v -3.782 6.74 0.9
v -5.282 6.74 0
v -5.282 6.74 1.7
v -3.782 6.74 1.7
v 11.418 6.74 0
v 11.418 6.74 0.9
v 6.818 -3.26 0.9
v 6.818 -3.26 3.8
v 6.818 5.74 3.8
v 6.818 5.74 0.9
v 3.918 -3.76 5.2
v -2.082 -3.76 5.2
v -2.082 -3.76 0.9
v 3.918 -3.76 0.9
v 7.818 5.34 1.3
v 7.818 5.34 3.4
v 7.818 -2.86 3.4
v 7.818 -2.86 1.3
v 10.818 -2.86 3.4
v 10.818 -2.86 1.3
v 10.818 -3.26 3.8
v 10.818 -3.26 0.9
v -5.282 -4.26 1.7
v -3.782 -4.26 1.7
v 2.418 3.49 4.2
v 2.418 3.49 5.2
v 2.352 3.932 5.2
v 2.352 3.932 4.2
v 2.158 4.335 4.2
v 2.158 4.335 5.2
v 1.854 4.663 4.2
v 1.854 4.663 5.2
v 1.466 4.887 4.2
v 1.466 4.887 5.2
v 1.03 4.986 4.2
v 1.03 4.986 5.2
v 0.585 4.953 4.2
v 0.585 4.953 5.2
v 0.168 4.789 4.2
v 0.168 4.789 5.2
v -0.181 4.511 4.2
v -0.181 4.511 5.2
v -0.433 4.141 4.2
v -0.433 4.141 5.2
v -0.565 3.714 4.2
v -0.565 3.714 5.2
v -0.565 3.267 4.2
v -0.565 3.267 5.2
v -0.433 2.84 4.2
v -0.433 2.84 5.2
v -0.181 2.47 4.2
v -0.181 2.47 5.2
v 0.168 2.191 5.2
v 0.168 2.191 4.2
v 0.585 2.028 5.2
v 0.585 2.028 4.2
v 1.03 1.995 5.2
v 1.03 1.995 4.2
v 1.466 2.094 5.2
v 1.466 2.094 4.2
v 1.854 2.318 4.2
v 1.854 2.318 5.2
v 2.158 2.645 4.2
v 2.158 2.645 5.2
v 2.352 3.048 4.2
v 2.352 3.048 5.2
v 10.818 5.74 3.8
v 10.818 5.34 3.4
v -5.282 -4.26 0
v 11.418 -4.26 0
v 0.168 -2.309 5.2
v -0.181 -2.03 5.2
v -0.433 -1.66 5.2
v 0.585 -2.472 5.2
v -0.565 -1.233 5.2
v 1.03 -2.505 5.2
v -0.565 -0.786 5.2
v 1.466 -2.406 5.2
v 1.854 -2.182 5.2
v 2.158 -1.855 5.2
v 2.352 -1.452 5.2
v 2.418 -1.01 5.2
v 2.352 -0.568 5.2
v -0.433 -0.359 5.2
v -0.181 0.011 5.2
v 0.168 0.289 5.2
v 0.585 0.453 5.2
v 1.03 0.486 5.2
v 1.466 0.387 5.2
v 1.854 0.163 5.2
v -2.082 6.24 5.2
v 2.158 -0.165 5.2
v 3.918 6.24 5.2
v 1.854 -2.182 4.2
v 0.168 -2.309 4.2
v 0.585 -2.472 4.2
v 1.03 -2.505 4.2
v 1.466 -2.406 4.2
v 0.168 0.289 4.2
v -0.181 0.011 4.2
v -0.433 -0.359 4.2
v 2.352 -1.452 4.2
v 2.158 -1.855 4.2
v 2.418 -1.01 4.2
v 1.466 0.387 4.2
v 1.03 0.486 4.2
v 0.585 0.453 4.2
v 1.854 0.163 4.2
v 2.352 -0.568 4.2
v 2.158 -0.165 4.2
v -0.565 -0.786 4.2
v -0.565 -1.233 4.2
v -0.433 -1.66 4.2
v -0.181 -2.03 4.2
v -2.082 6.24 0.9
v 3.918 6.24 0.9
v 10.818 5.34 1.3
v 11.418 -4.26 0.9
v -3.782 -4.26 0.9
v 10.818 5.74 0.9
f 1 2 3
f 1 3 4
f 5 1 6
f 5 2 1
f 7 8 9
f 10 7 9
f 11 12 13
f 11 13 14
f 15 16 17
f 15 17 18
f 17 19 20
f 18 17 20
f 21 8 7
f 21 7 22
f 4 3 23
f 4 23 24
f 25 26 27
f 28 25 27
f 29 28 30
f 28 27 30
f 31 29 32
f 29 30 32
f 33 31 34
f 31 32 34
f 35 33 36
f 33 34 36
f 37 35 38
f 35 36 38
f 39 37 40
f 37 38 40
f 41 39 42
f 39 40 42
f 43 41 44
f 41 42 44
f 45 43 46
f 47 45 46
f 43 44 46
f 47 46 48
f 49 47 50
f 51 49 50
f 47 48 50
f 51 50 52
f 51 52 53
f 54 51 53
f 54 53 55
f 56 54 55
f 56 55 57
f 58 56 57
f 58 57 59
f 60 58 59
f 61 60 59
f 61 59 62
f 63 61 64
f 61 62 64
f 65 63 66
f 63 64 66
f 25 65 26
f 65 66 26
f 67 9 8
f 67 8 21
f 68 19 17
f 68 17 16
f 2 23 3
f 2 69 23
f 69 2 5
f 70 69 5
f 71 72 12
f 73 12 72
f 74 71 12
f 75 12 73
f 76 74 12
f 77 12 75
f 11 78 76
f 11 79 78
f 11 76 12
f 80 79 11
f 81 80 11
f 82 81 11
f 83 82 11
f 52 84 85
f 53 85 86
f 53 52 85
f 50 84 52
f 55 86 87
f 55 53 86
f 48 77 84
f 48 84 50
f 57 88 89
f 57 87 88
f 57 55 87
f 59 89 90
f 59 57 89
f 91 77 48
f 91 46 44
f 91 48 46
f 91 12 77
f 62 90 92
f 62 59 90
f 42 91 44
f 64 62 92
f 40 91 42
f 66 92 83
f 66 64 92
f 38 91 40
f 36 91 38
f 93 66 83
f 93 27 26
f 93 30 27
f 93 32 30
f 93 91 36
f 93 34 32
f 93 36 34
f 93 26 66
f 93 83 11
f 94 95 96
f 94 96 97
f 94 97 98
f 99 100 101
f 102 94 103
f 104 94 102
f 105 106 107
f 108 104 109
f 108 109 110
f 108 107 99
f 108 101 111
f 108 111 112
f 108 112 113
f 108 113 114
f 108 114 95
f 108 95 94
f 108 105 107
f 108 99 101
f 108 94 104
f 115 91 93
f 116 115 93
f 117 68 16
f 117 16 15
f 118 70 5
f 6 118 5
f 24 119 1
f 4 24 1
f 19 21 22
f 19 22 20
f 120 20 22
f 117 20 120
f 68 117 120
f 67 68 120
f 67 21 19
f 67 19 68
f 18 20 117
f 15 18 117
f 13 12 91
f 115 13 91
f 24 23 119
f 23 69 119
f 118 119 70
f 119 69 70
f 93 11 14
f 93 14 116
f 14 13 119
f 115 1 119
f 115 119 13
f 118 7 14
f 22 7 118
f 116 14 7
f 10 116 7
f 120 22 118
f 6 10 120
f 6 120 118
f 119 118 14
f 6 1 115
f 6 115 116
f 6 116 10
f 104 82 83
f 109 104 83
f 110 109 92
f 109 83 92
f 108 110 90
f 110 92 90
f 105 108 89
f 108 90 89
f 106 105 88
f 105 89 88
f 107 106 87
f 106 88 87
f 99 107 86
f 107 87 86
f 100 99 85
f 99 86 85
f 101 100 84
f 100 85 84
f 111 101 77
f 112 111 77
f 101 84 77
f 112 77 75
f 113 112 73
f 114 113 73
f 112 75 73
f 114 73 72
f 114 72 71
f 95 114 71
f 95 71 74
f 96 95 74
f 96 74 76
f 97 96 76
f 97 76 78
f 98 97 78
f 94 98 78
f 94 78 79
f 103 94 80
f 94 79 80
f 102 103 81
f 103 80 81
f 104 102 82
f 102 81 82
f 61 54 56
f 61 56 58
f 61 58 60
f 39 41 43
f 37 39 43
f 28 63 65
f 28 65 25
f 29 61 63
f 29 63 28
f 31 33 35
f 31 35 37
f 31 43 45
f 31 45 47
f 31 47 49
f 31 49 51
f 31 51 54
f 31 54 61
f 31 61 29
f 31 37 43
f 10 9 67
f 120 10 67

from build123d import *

# Parameters (mm, degrees)
ESBO_O1_W                = 16.7
ESBO_O1_H                = 11
RESSALTO_EXTRUS_O1_DEPTH = 5.2
ESBO_O2_W                = 16.7
ESBO_O2_H                = 11
ESBO_O2_W_2              = 6
ESBO_O2_H_2              = 10
ESBO_O2_W_3              = 4
ESBO_O2_H_3              = 9
CORTE_EXTRUS_O1_DEPTH    = 4.3
ESBO_O3_W                = 4
ESBO_O3_H                = 9
CORTE_EXTRUS_O2_DEPTH    = 1.4
ESBO_O4_R                = 1.5
CORTE_EXTRUS_O3_DEPTH    = 1
ESBO_O5_W                = 2.1
ESBO_O5_H                = 8.2
CORTE_EXTRUS_O4_DEPTH    = 3
ESBO_O6_W                = 1.5
ESBO_O6_H                = 11
RESSALTO_EXTRUS_O2_DEPTH = 0.8


with BuildPart() as part:
    # Esboço1 → Ressalto-extrusão1 (new body)
    with BuildSketch(Plane.XY):
        with Locations((3.068373494, 1.240361446)):
            Rectangle(ESBO_O1_W, ESBO_O1_H)
    extrude(amount=RESSALTO_EXTRUS_O1_DEPTH)

    # Esboço2 → Corte-extrusão1 (cut)
    with BuildSketch(Plane.XY.offset(5.2)):
        with Locations((3.068373494, 1.240361446)):
            Rectangle(ESBO_O2_W, ESBO_O2_H)
        with Locations((0.918373494, 1.240361446)):
            Rectangle(ESBO_O2_W_2, ESBO_O2_H_2, mode=Mode.SUBTRACT)
        with Locations((8.818373494, 1.240361446)):
            Rectangle(ESBO_O2_W_3, ESBO_O2_H_3, mode=Mode.SUBTRACT)
    extrude(amount=-CORTE_EXTRUS_O1_DEPTH, mode=Mode.SUBTRACT)

    # Esboço3 → Corte-extrusão2 (cut)
    with BuildSketch(Plane.XY.offset(5.2)):
        with Locations((8.818373494, 1.240361446)):
            Rectangle(ESBO_O3_W, ESBO_O3_H)
    extrude(amount=-CORTE_EXTRUS_O2_DEPTH, mode=Mode.SUBTRACT)

    # Esboço4 → Corte-extrusão3 (cut)
    with BuildSketch(Plane.XY.offset(5.2)):
        with Locations((0.918373494, 3.490361446)):
            Circle(ESBO_O4_R)
        with Locations((0.918373494, -1.009638554)):
            Circle(ESBO_O4_R)
    extrude(amount=-CORTE_EXTRUS_O3_DEPTH, mode=Mode.SUBTRACT)

    # Esboço5 → Corte-extrusão4 (cut)
    with BuildSketch(Plane(origin=(10.818373494, 0, 0), x_dir=(0, 0, -1), z_dir=(1, 0, 0))):
        with Locations((-2.35, 1.240361446)):
            Rectangle(ESBO_O5_W, ESBO_O5_H)
    extrude(amount=-CORTE_EXTRUS_O4_DEPTH, mode=Mode.SUBTRACT)

    # Esboço6 → Ressalto-extrusão2 (add)
    with BuildSketch(Plane.XY.offset(0.9)):
        with Locations((-4.531626506, 1.240361446)):
            Rectangle(ESBO_O6_W, ESBO_O6_H)
    extrude(amount=RESSALTO_EXTRUS_O2_DEPTH)


solid = part.part
